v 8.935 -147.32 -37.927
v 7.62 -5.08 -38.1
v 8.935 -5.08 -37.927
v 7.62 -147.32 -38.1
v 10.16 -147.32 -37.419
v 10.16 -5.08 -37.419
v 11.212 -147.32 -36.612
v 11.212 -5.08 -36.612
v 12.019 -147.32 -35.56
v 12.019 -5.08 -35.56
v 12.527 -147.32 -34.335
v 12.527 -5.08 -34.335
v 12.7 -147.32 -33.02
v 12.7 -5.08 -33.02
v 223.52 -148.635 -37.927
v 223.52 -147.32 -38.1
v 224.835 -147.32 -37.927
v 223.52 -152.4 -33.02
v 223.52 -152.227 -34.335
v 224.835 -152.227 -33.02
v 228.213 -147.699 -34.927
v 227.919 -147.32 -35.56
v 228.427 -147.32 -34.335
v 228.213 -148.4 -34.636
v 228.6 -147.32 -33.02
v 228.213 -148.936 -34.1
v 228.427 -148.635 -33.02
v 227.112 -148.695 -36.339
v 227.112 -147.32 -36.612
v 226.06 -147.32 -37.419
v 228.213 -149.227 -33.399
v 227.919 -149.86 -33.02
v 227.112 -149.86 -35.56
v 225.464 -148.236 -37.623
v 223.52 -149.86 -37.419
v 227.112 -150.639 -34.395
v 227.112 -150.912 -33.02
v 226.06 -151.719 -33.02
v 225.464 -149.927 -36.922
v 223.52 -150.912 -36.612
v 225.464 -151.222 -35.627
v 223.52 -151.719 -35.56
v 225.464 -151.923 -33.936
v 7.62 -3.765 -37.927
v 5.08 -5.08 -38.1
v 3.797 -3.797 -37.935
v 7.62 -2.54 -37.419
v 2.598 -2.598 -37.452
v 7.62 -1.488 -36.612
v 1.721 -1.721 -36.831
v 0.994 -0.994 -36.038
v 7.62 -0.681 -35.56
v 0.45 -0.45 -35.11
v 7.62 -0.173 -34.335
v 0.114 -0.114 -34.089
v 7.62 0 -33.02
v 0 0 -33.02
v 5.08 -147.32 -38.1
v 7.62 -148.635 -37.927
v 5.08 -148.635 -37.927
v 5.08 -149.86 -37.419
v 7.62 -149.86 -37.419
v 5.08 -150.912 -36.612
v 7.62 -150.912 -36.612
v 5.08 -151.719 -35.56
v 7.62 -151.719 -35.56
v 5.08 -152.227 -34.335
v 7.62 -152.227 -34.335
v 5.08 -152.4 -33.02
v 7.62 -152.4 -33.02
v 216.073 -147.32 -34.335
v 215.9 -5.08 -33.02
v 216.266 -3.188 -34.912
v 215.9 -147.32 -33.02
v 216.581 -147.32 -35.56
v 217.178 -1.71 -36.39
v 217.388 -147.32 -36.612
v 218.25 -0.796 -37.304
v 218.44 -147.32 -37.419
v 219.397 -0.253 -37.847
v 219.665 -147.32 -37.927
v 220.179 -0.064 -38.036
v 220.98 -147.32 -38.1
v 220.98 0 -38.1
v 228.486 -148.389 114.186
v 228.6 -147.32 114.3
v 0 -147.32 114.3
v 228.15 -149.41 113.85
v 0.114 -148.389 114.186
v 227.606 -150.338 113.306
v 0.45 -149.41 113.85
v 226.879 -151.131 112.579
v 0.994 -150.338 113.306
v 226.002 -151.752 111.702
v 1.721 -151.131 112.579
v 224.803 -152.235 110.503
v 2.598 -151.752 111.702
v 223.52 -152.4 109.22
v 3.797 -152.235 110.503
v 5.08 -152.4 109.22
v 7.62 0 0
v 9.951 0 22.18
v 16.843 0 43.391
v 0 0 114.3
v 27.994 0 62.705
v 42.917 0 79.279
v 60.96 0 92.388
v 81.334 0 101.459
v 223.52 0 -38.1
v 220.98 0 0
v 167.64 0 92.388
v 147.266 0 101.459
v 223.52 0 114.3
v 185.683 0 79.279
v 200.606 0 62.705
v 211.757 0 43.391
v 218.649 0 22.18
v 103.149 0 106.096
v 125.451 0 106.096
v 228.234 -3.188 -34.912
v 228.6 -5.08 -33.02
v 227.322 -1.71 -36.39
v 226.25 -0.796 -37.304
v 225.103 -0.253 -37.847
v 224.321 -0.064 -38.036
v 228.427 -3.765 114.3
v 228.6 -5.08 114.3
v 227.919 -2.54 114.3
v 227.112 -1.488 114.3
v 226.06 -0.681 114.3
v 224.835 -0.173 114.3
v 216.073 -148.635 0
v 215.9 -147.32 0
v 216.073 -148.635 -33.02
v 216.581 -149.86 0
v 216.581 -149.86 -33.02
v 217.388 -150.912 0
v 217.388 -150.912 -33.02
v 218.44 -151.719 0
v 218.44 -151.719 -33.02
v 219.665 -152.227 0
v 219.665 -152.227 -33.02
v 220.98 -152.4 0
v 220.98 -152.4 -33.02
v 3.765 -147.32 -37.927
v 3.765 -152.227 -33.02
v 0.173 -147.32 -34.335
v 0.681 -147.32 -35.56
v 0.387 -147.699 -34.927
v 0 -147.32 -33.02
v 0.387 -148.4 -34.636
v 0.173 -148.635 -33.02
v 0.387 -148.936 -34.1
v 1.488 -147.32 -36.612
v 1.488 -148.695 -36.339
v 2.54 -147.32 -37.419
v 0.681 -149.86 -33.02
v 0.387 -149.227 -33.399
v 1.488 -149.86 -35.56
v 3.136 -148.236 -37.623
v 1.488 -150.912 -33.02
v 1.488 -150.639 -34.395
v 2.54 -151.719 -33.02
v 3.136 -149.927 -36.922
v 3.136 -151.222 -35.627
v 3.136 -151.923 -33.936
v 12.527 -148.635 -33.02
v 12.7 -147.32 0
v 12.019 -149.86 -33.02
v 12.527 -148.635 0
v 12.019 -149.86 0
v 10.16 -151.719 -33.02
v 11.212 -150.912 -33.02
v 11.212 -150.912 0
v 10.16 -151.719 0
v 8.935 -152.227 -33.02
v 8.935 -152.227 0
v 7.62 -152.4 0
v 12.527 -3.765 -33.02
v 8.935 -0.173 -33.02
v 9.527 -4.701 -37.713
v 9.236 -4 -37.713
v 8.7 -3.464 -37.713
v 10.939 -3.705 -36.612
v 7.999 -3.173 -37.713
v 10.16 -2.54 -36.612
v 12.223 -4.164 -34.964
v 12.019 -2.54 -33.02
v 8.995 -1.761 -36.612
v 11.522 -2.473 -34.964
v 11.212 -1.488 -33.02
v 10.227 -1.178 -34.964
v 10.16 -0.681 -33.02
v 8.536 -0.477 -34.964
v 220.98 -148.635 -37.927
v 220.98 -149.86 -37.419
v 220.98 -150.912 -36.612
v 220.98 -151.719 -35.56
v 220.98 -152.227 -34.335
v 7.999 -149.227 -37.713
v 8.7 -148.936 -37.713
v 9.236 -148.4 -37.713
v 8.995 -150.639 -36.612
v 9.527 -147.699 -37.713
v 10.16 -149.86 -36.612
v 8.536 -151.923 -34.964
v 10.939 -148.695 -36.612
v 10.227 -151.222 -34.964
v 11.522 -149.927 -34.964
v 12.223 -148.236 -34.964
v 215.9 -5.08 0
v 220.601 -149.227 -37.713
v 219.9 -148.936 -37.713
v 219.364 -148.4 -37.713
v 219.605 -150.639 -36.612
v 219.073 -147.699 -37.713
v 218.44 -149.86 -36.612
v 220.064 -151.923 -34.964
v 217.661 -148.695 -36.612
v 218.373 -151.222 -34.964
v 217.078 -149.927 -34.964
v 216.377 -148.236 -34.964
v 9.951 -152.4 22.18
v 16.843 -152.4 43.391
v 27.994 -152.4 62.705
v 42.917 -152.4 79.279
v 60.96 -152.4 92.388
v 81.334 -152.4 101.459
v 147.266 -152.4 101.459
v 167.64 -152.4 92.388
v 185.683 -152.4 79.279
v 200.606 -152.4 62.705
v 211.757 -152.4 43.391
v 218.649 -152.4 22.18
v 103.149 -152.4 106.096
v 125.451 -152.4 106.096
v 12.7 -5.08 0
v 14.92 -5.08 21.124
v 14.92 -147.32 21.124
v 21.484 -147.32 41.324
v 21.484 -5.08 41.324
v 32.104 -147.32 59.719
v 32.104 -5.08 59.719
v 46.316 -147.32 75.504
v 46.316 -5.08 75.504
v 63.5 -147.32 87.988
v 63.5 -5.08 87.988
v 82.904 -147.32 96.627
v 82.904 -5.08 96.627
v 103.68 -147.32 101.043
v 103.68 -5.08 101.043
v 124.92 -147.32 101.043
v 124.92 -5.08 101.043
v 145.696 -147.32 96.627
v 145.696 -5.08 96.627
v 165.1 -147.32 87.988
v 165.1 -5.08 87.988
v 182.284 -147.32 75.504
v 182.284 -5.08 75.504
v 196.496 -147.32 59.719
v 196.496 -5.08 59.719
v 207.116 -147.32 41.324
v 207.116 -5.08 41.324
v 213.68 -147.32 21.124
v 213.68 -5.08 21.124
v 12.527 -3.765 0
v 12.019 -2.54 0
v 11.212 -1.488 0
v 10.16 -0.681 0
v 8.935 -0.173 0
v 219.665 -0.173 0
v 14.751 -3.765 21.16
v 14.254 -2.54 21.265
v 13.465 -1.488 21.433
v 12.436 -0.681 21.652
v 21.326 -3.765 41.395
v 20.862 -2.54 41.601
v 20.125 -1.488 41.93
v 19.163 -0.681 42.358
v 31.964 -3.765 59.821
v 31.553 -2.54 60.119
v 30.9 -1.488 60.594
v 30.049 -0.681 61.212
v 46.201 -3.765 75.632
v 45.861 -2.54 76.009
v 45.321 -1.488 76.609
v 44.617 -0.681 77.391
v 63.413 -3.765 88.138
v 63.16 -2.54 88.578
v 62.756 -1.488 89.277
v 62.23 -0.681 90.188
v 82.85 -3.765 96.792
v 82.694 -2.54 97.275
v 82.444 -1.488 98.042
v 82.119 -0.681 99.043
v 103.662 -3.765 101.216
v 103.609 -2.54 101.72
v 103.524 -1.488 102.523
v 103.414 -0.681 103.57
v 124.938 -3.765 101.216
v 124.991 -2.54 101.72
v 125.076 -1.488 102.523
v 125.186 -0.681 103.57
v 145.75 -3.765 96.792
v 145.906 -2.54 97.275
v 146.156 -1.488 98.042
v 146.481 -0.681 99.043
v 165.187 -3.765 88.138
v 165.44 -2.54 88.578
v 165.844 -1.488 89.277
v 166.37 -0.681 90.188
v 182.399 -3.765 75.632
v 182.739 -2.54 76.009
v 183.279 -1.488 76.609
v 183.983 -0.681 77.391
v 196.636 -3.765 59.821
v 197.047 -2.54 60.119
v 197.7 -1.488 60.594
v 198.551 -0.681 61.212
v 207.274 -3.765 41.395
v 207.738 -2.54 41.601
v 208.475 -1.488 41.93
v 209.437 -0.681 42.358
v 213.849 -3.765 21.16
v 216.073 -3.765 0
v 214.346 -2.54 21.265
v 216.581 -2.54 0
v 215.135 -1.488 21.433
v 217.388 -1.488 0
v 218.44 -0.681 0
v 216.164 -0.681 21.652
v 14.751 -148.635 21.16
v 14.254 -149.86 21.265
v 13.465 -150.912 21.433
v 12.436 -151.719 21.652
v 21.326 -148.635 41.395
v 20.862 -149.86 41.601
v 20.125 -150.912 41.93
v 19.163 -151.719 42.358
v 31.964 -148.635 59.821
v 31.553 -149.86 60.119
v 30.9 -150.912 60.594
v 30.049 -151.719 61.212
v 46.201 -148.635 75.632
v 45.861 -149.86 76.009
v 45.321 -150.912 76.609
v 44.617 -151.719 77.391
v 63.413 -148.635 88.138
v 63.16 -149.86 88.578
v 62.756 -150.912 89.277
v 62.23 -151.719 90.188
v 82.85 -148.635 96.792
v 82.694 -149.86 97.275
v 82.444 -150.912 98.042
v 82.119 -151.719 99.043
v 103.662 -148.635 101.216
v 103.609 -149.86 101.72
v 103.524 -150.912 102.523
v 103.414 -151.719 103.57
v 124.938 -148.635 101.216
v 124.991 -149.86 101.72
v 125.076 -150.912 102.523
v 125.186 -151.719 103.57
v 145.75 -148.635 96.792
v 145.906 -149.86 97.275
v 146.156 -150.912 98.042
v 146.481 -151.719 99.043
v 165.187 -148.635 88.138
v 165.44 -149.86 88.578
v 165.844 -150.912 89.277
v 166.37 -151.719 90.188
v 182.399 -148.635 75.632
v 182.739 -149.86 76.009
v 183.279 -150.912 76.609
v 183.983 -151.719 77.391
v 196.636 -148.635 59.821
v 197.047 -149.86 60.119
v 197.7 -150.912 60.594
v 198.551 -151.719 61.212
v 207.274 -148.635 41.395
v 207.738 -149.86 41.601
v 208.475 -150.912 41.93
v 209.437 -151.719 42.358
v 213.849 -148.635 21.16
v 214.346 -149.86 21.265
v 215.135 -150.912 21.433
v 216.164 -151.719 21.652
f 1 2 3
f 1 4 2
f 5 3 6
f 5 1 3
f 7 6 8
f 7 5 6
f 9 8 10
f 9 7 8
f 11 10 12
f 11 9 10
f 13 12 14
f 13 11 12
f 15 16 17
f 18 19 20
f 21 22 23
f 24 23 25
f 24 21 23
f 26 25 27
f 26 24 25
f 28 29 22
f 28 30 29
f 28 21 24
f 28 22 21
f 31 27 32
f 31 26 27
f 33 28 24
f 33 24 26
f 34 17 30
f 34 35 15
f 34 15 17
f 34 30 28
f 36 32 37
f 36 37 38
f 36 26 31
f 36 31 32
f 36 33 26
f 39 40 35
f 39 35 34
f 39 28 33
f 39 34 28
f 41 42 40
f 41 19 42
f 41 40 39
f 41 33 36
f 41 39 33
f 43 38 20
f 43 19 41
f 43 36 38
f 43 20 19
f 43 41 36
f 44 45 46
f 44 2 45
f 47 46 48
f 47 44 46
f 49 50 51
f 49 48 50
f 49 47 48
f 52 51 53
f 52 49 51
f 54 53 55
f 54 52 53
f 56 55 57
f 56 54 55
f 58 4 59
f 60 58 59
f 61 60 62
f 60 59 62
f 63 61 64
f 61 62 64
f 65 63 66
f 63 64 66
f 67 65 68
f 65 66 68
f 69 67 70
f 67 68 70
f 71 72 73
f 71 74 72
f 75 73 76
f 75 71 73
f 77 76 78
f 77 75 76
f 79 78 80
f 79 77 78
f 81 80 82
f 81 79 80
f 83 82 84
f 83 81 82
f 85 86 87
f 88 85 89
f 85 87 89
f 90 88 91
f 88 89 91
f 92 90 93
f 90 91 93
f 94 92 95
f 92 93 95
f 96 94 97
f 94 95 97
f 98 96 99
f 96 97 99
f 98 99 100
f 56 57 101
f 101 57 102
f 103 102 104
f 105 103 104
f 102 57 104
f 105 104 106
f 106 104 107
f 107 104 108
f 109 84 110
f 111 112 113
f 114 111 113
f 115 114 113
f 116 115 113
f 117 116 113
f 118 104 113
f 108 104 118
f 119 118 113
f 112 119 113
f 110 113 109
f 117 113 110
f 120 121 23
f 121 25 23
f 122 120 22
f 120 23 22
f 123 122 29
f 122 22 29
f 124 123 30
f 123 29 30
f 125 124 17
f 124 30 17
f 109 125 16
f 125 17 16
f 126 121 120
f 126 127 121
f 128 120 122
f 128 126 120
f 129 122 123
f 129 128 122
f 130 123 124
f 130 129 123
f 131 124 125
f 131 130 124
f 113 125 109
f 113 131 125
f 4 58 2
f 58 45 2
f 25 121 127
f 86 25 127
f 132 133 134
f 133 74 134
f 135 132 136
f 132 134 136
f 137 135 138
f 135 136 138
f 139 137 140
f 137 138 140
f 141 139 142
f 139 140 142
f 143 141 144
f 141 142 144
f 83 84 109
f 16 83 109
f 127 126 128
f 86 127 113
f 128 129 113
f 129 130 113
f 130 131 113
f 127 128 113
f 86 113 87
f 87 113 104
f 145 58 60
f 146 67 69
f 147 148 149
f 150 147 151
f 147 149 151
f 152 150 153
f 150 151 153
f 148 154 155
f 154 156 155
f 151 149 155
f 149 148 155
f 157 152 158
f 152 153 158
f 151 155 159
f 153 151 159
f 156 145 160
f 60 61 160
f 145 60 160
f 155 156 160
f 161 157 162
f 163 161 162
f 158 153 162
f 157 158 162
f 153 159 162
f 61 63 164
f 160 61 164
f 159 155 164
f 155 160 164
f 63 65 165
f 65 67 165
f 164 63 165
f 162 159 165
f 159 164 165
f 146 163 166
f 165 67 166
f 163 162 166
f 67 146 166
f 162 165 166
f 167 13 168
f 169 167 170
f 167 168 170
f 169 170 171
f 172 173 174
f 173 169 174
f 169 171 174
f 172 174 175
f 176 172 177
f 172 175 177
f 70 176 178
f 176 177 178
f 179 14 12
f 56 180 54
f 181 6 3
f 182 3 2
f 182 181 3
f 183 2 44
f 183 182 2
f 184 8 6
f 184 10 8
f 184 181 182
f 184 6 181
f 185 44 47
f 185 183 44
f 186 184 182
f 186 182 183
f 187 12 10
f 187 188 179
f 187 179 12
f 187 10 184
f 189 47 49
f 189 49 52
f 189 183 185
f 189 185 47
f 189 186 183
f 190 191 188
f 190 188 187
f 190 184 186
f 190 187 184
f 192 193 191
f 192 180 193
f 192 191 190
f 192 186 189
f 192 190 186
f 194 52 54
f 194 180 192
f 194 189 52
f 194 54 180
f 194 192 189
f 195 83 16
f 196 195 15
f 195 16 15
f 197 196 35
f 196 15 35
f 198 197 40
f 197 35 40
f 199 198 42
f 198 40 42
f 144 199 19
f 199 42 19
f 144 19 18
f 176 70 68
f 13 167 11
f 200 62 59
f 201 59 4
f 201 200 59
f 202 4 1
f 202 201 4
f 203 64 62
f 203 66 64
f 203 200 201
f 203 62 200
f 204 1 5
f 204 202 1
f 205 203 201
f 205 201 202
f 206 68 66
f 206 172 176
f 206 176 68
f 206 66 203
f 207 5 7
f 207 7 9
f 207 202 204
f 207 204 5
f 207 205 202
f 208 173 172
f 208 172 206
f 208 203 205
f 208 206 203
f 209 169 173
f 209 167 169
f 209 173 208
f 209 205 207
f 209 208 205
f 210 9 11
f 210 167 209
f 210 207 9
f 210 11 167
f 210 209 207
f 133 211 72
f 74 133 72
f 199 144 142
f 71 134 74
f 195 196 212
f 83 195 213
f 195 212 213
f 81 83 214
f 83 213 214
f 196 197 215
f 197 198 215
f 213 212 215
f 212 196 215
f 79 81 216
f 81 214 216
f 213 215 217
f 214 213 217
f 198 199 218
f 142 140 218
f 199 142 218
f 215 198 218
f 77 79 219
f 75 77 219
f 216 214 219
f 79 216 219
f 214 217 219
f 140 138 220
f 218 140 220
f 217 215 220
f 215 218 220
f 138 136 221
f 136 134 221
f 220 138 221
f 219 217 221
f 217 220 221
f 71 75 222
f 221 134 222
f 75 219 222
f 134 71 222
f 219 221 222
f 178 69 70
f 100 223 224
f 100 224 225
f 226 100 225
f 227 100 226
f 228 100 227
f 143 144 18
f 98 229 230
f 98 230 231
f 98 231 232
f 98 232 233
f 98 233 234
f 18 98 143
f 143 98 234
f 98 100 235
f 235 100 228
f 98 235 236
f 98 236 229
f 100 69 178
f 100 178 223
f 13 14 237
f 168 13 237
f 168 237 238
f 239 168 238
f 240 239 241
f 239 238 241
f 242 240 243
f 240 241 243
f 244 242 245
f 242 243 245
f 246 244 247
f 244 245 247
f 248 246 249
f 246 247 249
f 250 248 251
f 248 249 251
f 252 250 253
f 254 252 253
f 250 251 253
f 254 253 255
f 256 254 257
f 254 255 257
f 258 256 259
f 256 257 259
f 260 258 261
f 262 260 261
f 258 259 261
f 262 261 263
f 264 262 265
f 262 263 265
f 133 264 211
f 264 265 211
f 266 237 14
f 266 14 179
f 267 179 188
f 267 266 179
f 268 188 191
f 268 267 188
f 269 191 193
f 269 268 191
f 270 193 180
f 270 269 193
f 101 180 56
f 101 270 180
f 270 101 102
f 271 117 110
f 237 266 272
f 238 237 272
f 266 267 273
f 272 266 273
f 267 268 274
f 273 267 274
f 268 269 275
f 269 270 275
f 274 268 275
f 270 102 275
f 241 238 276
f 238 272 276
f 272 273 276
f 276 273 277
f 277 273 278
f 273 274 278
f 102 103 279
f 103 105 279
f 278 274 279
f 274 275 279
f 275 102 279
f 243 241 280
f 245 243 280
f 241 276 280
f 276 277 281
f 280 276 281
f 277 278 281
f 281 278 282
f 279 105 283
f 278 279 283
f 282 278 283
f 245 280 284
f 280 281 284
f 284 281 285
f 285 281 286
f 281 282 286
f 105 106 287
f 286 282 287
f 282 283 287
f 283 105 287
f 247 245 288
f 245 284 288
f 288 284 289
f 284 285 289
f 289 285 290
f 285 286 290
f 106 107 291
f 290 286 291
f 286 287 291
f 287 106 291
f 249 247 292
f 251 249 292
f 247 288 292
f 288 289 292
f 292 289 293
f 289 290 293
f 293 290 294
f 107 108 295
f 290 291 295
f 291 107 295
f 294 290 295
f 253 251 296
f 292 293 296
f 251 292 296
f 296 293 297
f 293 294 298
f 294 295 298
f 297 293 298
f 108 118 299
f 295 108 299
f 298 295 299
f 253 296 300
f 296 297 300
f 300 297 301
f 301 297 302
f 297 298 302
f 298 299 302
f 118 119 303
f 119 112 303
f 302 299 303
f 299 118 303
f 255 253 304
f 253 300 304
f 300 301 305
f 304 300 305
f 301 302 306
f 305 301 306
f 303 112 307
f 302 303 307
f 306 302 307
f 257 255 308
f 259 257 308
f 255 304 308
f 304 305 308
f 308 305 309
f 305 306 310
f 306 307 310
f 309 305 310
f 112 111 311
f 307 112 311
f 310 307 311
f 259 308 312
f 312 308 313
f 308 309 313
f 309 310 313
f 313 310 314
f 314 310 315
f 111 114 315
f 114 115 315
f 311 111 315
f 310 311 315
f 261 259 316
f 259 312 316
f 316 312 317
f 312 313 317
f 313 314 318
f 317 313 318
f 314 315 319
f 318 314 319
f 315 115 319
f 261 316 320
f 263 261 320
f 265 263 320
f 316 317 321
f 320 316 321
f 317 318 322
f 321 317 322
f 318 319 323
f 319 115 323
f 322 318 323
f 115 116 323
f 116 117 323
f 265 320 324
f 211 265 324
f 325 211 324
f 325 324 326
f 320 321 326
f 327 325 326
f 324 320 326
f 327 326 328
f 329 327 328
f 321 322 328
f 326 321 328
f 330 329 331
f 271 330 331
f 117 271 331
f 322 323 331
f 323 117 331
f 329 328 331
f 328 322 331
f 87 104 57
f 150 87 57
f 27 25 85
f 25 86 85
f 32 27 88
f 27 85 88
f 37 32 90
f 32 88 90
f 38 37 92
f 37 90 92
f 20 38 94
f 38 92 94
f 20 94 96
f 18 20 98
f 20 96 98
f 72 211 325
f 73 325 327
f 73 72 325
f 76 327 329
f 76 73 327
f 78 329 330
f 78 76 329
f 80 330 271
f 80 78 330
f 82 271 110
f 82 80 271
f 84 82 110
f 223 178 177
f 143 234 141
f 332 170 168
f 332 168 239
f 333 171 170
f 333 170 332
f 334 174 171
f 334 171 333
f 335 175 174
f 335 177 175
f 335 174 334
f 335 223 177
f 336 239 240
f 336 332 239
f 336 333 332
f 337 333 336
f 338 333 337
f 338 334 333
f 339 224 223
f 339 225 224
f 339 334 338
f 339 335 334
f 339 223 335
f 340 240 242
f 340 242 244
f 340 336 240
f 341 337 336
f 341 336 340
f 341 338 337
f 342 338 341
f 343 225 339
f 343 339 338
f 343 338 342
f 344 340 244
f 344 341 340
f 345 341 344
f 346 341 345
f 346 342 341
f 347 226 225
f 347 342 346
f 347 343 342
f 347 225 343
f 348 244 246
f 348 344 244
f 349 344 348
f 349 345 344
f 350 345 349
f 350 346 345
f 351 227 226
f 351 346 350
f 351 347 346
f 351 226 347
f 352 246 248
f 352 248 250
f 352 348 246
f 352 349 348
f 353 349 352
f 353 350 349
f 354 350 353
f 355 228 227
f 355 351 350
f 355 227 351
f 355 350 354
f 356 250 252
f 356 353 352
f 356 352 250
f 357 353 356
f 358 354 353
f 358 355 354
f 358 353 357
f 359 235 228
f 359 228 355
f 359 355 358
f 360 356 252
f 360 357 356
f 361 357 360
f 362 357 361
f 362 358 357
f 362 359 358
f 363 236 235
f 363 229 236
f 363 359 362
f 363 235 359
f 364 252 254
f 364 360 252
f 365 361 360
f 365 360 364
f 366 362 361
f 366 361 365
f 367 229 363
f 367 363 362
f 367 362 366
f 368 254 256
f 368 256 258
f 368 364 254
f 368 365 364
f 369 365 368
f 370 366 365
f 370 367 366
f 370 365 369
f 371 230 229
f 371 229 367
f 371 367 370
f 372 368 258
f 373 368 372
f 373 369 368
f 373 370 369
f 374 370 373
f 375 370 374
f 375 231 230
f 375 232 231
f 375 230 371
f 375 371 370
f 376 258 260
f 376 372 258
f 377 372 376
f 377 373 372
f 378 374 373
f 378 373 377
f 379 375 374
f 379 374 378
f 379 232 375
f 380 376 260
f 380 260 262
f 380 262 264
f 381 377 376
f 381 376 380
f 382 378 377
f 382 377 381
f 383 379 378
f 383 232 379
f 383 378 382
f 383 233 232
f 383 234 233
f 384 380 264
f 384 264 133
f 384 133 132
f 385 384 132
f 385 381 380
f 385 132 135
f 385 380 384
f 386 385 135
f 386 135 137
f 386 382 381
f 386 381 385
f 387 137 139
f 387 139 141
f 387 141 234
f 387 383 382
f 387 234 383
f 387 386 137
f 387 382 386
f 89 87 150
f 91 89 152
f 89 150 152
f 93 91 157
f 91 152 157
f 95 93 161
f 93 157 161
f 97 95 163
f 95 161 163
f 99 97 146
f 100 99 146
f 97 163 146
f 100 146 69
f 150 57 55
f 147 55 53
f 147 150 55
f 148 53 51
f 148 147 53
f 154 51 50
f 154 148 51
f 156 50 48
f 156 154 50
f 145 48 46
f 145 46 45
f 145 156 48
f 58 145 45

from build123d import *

# Parameters (mm, degrees)
F1_DEPTH = 152.4
F2_R     = 5.08


# Not quite as in the source:
# - two fillets or chamfers of one size are made in one step
# - a feature names something its author has since deleted; it is built from what else it names


with BuildPart() as f1:
    # F0 (on Front) → F1 (new body)
    with BuildSketch(Plane.XZ):
        with BuildLine():
            Line((228.6, -38.1), (228.6, 0))
            ThreePointArc((228.6, 0), (195.1223050896, 80.8223050896), (114.3, 114.3))
            ThreePointArc((114.3, 114.3), (33.4776949104, 80.8223050896), (0, 0))
            Line((0, 0), (0, -38.1))
            Line((0, -38.1), (12.7, -38.1))
            Line((12.7, -38.1), (12.7, 0))
            ThreePointArc((12.7, 0), (114.3, 101.6), (215.9, 0))
            Line((215.9, 0), (215.9, -38.1))
            Line((215.9, -38.1), (228.6, -38.1))
        make_face()
        with BuildLine():
            ThreePointArc((114.3, 114.3), (195.1223050896, 80.8223050896), (228.6, 0))
            Line((228.6, 0), (228.6, 114.3))
            Line((228.6, 114.3), (114.3, 114.3))
        make_face()
        with BuildLine():
            ThreePointArc((0, 0), (33.4776949104, 80.8223050896), (114.3, 114.3))
            Line((114.3, 114.3), (0, 114.3))
            Line((0, 114.3), (0, 0))
        make_face()
    extrude(amount=F1_DEPTH)

    # F2
    f2_edges = [f1.edges().sort_by_distance(p)[0] for p in [
        (114.3, -152.4, 101.6),
        (114.3, 0, 101.6),
        (222.25, -152.4, -38.1),
        (6.35, -152.4, -38.1),
        (12.7, -76.2, -38.1),
        (0, -76.2, -38.1),
        (6.35, 0, -38.1),
        (215.9, -76.2, -38.1),
        (215.9, 0, -19.05),
        (215.9, -152.4, -19.05),
        (228.6, -76.2, -38.1),
        (228.6, 0, 38.1),
        (228.6, -152.4, 38.1),
        (114.3, -152.4, 114.3),
        (0, -152.4, 38.1),
        (12.7, 0, -19.05),
        (12.7, -152.4, -19.05),
    ]]
    fillet(f2_edges, radius=F2_R)


solid = f1.part
